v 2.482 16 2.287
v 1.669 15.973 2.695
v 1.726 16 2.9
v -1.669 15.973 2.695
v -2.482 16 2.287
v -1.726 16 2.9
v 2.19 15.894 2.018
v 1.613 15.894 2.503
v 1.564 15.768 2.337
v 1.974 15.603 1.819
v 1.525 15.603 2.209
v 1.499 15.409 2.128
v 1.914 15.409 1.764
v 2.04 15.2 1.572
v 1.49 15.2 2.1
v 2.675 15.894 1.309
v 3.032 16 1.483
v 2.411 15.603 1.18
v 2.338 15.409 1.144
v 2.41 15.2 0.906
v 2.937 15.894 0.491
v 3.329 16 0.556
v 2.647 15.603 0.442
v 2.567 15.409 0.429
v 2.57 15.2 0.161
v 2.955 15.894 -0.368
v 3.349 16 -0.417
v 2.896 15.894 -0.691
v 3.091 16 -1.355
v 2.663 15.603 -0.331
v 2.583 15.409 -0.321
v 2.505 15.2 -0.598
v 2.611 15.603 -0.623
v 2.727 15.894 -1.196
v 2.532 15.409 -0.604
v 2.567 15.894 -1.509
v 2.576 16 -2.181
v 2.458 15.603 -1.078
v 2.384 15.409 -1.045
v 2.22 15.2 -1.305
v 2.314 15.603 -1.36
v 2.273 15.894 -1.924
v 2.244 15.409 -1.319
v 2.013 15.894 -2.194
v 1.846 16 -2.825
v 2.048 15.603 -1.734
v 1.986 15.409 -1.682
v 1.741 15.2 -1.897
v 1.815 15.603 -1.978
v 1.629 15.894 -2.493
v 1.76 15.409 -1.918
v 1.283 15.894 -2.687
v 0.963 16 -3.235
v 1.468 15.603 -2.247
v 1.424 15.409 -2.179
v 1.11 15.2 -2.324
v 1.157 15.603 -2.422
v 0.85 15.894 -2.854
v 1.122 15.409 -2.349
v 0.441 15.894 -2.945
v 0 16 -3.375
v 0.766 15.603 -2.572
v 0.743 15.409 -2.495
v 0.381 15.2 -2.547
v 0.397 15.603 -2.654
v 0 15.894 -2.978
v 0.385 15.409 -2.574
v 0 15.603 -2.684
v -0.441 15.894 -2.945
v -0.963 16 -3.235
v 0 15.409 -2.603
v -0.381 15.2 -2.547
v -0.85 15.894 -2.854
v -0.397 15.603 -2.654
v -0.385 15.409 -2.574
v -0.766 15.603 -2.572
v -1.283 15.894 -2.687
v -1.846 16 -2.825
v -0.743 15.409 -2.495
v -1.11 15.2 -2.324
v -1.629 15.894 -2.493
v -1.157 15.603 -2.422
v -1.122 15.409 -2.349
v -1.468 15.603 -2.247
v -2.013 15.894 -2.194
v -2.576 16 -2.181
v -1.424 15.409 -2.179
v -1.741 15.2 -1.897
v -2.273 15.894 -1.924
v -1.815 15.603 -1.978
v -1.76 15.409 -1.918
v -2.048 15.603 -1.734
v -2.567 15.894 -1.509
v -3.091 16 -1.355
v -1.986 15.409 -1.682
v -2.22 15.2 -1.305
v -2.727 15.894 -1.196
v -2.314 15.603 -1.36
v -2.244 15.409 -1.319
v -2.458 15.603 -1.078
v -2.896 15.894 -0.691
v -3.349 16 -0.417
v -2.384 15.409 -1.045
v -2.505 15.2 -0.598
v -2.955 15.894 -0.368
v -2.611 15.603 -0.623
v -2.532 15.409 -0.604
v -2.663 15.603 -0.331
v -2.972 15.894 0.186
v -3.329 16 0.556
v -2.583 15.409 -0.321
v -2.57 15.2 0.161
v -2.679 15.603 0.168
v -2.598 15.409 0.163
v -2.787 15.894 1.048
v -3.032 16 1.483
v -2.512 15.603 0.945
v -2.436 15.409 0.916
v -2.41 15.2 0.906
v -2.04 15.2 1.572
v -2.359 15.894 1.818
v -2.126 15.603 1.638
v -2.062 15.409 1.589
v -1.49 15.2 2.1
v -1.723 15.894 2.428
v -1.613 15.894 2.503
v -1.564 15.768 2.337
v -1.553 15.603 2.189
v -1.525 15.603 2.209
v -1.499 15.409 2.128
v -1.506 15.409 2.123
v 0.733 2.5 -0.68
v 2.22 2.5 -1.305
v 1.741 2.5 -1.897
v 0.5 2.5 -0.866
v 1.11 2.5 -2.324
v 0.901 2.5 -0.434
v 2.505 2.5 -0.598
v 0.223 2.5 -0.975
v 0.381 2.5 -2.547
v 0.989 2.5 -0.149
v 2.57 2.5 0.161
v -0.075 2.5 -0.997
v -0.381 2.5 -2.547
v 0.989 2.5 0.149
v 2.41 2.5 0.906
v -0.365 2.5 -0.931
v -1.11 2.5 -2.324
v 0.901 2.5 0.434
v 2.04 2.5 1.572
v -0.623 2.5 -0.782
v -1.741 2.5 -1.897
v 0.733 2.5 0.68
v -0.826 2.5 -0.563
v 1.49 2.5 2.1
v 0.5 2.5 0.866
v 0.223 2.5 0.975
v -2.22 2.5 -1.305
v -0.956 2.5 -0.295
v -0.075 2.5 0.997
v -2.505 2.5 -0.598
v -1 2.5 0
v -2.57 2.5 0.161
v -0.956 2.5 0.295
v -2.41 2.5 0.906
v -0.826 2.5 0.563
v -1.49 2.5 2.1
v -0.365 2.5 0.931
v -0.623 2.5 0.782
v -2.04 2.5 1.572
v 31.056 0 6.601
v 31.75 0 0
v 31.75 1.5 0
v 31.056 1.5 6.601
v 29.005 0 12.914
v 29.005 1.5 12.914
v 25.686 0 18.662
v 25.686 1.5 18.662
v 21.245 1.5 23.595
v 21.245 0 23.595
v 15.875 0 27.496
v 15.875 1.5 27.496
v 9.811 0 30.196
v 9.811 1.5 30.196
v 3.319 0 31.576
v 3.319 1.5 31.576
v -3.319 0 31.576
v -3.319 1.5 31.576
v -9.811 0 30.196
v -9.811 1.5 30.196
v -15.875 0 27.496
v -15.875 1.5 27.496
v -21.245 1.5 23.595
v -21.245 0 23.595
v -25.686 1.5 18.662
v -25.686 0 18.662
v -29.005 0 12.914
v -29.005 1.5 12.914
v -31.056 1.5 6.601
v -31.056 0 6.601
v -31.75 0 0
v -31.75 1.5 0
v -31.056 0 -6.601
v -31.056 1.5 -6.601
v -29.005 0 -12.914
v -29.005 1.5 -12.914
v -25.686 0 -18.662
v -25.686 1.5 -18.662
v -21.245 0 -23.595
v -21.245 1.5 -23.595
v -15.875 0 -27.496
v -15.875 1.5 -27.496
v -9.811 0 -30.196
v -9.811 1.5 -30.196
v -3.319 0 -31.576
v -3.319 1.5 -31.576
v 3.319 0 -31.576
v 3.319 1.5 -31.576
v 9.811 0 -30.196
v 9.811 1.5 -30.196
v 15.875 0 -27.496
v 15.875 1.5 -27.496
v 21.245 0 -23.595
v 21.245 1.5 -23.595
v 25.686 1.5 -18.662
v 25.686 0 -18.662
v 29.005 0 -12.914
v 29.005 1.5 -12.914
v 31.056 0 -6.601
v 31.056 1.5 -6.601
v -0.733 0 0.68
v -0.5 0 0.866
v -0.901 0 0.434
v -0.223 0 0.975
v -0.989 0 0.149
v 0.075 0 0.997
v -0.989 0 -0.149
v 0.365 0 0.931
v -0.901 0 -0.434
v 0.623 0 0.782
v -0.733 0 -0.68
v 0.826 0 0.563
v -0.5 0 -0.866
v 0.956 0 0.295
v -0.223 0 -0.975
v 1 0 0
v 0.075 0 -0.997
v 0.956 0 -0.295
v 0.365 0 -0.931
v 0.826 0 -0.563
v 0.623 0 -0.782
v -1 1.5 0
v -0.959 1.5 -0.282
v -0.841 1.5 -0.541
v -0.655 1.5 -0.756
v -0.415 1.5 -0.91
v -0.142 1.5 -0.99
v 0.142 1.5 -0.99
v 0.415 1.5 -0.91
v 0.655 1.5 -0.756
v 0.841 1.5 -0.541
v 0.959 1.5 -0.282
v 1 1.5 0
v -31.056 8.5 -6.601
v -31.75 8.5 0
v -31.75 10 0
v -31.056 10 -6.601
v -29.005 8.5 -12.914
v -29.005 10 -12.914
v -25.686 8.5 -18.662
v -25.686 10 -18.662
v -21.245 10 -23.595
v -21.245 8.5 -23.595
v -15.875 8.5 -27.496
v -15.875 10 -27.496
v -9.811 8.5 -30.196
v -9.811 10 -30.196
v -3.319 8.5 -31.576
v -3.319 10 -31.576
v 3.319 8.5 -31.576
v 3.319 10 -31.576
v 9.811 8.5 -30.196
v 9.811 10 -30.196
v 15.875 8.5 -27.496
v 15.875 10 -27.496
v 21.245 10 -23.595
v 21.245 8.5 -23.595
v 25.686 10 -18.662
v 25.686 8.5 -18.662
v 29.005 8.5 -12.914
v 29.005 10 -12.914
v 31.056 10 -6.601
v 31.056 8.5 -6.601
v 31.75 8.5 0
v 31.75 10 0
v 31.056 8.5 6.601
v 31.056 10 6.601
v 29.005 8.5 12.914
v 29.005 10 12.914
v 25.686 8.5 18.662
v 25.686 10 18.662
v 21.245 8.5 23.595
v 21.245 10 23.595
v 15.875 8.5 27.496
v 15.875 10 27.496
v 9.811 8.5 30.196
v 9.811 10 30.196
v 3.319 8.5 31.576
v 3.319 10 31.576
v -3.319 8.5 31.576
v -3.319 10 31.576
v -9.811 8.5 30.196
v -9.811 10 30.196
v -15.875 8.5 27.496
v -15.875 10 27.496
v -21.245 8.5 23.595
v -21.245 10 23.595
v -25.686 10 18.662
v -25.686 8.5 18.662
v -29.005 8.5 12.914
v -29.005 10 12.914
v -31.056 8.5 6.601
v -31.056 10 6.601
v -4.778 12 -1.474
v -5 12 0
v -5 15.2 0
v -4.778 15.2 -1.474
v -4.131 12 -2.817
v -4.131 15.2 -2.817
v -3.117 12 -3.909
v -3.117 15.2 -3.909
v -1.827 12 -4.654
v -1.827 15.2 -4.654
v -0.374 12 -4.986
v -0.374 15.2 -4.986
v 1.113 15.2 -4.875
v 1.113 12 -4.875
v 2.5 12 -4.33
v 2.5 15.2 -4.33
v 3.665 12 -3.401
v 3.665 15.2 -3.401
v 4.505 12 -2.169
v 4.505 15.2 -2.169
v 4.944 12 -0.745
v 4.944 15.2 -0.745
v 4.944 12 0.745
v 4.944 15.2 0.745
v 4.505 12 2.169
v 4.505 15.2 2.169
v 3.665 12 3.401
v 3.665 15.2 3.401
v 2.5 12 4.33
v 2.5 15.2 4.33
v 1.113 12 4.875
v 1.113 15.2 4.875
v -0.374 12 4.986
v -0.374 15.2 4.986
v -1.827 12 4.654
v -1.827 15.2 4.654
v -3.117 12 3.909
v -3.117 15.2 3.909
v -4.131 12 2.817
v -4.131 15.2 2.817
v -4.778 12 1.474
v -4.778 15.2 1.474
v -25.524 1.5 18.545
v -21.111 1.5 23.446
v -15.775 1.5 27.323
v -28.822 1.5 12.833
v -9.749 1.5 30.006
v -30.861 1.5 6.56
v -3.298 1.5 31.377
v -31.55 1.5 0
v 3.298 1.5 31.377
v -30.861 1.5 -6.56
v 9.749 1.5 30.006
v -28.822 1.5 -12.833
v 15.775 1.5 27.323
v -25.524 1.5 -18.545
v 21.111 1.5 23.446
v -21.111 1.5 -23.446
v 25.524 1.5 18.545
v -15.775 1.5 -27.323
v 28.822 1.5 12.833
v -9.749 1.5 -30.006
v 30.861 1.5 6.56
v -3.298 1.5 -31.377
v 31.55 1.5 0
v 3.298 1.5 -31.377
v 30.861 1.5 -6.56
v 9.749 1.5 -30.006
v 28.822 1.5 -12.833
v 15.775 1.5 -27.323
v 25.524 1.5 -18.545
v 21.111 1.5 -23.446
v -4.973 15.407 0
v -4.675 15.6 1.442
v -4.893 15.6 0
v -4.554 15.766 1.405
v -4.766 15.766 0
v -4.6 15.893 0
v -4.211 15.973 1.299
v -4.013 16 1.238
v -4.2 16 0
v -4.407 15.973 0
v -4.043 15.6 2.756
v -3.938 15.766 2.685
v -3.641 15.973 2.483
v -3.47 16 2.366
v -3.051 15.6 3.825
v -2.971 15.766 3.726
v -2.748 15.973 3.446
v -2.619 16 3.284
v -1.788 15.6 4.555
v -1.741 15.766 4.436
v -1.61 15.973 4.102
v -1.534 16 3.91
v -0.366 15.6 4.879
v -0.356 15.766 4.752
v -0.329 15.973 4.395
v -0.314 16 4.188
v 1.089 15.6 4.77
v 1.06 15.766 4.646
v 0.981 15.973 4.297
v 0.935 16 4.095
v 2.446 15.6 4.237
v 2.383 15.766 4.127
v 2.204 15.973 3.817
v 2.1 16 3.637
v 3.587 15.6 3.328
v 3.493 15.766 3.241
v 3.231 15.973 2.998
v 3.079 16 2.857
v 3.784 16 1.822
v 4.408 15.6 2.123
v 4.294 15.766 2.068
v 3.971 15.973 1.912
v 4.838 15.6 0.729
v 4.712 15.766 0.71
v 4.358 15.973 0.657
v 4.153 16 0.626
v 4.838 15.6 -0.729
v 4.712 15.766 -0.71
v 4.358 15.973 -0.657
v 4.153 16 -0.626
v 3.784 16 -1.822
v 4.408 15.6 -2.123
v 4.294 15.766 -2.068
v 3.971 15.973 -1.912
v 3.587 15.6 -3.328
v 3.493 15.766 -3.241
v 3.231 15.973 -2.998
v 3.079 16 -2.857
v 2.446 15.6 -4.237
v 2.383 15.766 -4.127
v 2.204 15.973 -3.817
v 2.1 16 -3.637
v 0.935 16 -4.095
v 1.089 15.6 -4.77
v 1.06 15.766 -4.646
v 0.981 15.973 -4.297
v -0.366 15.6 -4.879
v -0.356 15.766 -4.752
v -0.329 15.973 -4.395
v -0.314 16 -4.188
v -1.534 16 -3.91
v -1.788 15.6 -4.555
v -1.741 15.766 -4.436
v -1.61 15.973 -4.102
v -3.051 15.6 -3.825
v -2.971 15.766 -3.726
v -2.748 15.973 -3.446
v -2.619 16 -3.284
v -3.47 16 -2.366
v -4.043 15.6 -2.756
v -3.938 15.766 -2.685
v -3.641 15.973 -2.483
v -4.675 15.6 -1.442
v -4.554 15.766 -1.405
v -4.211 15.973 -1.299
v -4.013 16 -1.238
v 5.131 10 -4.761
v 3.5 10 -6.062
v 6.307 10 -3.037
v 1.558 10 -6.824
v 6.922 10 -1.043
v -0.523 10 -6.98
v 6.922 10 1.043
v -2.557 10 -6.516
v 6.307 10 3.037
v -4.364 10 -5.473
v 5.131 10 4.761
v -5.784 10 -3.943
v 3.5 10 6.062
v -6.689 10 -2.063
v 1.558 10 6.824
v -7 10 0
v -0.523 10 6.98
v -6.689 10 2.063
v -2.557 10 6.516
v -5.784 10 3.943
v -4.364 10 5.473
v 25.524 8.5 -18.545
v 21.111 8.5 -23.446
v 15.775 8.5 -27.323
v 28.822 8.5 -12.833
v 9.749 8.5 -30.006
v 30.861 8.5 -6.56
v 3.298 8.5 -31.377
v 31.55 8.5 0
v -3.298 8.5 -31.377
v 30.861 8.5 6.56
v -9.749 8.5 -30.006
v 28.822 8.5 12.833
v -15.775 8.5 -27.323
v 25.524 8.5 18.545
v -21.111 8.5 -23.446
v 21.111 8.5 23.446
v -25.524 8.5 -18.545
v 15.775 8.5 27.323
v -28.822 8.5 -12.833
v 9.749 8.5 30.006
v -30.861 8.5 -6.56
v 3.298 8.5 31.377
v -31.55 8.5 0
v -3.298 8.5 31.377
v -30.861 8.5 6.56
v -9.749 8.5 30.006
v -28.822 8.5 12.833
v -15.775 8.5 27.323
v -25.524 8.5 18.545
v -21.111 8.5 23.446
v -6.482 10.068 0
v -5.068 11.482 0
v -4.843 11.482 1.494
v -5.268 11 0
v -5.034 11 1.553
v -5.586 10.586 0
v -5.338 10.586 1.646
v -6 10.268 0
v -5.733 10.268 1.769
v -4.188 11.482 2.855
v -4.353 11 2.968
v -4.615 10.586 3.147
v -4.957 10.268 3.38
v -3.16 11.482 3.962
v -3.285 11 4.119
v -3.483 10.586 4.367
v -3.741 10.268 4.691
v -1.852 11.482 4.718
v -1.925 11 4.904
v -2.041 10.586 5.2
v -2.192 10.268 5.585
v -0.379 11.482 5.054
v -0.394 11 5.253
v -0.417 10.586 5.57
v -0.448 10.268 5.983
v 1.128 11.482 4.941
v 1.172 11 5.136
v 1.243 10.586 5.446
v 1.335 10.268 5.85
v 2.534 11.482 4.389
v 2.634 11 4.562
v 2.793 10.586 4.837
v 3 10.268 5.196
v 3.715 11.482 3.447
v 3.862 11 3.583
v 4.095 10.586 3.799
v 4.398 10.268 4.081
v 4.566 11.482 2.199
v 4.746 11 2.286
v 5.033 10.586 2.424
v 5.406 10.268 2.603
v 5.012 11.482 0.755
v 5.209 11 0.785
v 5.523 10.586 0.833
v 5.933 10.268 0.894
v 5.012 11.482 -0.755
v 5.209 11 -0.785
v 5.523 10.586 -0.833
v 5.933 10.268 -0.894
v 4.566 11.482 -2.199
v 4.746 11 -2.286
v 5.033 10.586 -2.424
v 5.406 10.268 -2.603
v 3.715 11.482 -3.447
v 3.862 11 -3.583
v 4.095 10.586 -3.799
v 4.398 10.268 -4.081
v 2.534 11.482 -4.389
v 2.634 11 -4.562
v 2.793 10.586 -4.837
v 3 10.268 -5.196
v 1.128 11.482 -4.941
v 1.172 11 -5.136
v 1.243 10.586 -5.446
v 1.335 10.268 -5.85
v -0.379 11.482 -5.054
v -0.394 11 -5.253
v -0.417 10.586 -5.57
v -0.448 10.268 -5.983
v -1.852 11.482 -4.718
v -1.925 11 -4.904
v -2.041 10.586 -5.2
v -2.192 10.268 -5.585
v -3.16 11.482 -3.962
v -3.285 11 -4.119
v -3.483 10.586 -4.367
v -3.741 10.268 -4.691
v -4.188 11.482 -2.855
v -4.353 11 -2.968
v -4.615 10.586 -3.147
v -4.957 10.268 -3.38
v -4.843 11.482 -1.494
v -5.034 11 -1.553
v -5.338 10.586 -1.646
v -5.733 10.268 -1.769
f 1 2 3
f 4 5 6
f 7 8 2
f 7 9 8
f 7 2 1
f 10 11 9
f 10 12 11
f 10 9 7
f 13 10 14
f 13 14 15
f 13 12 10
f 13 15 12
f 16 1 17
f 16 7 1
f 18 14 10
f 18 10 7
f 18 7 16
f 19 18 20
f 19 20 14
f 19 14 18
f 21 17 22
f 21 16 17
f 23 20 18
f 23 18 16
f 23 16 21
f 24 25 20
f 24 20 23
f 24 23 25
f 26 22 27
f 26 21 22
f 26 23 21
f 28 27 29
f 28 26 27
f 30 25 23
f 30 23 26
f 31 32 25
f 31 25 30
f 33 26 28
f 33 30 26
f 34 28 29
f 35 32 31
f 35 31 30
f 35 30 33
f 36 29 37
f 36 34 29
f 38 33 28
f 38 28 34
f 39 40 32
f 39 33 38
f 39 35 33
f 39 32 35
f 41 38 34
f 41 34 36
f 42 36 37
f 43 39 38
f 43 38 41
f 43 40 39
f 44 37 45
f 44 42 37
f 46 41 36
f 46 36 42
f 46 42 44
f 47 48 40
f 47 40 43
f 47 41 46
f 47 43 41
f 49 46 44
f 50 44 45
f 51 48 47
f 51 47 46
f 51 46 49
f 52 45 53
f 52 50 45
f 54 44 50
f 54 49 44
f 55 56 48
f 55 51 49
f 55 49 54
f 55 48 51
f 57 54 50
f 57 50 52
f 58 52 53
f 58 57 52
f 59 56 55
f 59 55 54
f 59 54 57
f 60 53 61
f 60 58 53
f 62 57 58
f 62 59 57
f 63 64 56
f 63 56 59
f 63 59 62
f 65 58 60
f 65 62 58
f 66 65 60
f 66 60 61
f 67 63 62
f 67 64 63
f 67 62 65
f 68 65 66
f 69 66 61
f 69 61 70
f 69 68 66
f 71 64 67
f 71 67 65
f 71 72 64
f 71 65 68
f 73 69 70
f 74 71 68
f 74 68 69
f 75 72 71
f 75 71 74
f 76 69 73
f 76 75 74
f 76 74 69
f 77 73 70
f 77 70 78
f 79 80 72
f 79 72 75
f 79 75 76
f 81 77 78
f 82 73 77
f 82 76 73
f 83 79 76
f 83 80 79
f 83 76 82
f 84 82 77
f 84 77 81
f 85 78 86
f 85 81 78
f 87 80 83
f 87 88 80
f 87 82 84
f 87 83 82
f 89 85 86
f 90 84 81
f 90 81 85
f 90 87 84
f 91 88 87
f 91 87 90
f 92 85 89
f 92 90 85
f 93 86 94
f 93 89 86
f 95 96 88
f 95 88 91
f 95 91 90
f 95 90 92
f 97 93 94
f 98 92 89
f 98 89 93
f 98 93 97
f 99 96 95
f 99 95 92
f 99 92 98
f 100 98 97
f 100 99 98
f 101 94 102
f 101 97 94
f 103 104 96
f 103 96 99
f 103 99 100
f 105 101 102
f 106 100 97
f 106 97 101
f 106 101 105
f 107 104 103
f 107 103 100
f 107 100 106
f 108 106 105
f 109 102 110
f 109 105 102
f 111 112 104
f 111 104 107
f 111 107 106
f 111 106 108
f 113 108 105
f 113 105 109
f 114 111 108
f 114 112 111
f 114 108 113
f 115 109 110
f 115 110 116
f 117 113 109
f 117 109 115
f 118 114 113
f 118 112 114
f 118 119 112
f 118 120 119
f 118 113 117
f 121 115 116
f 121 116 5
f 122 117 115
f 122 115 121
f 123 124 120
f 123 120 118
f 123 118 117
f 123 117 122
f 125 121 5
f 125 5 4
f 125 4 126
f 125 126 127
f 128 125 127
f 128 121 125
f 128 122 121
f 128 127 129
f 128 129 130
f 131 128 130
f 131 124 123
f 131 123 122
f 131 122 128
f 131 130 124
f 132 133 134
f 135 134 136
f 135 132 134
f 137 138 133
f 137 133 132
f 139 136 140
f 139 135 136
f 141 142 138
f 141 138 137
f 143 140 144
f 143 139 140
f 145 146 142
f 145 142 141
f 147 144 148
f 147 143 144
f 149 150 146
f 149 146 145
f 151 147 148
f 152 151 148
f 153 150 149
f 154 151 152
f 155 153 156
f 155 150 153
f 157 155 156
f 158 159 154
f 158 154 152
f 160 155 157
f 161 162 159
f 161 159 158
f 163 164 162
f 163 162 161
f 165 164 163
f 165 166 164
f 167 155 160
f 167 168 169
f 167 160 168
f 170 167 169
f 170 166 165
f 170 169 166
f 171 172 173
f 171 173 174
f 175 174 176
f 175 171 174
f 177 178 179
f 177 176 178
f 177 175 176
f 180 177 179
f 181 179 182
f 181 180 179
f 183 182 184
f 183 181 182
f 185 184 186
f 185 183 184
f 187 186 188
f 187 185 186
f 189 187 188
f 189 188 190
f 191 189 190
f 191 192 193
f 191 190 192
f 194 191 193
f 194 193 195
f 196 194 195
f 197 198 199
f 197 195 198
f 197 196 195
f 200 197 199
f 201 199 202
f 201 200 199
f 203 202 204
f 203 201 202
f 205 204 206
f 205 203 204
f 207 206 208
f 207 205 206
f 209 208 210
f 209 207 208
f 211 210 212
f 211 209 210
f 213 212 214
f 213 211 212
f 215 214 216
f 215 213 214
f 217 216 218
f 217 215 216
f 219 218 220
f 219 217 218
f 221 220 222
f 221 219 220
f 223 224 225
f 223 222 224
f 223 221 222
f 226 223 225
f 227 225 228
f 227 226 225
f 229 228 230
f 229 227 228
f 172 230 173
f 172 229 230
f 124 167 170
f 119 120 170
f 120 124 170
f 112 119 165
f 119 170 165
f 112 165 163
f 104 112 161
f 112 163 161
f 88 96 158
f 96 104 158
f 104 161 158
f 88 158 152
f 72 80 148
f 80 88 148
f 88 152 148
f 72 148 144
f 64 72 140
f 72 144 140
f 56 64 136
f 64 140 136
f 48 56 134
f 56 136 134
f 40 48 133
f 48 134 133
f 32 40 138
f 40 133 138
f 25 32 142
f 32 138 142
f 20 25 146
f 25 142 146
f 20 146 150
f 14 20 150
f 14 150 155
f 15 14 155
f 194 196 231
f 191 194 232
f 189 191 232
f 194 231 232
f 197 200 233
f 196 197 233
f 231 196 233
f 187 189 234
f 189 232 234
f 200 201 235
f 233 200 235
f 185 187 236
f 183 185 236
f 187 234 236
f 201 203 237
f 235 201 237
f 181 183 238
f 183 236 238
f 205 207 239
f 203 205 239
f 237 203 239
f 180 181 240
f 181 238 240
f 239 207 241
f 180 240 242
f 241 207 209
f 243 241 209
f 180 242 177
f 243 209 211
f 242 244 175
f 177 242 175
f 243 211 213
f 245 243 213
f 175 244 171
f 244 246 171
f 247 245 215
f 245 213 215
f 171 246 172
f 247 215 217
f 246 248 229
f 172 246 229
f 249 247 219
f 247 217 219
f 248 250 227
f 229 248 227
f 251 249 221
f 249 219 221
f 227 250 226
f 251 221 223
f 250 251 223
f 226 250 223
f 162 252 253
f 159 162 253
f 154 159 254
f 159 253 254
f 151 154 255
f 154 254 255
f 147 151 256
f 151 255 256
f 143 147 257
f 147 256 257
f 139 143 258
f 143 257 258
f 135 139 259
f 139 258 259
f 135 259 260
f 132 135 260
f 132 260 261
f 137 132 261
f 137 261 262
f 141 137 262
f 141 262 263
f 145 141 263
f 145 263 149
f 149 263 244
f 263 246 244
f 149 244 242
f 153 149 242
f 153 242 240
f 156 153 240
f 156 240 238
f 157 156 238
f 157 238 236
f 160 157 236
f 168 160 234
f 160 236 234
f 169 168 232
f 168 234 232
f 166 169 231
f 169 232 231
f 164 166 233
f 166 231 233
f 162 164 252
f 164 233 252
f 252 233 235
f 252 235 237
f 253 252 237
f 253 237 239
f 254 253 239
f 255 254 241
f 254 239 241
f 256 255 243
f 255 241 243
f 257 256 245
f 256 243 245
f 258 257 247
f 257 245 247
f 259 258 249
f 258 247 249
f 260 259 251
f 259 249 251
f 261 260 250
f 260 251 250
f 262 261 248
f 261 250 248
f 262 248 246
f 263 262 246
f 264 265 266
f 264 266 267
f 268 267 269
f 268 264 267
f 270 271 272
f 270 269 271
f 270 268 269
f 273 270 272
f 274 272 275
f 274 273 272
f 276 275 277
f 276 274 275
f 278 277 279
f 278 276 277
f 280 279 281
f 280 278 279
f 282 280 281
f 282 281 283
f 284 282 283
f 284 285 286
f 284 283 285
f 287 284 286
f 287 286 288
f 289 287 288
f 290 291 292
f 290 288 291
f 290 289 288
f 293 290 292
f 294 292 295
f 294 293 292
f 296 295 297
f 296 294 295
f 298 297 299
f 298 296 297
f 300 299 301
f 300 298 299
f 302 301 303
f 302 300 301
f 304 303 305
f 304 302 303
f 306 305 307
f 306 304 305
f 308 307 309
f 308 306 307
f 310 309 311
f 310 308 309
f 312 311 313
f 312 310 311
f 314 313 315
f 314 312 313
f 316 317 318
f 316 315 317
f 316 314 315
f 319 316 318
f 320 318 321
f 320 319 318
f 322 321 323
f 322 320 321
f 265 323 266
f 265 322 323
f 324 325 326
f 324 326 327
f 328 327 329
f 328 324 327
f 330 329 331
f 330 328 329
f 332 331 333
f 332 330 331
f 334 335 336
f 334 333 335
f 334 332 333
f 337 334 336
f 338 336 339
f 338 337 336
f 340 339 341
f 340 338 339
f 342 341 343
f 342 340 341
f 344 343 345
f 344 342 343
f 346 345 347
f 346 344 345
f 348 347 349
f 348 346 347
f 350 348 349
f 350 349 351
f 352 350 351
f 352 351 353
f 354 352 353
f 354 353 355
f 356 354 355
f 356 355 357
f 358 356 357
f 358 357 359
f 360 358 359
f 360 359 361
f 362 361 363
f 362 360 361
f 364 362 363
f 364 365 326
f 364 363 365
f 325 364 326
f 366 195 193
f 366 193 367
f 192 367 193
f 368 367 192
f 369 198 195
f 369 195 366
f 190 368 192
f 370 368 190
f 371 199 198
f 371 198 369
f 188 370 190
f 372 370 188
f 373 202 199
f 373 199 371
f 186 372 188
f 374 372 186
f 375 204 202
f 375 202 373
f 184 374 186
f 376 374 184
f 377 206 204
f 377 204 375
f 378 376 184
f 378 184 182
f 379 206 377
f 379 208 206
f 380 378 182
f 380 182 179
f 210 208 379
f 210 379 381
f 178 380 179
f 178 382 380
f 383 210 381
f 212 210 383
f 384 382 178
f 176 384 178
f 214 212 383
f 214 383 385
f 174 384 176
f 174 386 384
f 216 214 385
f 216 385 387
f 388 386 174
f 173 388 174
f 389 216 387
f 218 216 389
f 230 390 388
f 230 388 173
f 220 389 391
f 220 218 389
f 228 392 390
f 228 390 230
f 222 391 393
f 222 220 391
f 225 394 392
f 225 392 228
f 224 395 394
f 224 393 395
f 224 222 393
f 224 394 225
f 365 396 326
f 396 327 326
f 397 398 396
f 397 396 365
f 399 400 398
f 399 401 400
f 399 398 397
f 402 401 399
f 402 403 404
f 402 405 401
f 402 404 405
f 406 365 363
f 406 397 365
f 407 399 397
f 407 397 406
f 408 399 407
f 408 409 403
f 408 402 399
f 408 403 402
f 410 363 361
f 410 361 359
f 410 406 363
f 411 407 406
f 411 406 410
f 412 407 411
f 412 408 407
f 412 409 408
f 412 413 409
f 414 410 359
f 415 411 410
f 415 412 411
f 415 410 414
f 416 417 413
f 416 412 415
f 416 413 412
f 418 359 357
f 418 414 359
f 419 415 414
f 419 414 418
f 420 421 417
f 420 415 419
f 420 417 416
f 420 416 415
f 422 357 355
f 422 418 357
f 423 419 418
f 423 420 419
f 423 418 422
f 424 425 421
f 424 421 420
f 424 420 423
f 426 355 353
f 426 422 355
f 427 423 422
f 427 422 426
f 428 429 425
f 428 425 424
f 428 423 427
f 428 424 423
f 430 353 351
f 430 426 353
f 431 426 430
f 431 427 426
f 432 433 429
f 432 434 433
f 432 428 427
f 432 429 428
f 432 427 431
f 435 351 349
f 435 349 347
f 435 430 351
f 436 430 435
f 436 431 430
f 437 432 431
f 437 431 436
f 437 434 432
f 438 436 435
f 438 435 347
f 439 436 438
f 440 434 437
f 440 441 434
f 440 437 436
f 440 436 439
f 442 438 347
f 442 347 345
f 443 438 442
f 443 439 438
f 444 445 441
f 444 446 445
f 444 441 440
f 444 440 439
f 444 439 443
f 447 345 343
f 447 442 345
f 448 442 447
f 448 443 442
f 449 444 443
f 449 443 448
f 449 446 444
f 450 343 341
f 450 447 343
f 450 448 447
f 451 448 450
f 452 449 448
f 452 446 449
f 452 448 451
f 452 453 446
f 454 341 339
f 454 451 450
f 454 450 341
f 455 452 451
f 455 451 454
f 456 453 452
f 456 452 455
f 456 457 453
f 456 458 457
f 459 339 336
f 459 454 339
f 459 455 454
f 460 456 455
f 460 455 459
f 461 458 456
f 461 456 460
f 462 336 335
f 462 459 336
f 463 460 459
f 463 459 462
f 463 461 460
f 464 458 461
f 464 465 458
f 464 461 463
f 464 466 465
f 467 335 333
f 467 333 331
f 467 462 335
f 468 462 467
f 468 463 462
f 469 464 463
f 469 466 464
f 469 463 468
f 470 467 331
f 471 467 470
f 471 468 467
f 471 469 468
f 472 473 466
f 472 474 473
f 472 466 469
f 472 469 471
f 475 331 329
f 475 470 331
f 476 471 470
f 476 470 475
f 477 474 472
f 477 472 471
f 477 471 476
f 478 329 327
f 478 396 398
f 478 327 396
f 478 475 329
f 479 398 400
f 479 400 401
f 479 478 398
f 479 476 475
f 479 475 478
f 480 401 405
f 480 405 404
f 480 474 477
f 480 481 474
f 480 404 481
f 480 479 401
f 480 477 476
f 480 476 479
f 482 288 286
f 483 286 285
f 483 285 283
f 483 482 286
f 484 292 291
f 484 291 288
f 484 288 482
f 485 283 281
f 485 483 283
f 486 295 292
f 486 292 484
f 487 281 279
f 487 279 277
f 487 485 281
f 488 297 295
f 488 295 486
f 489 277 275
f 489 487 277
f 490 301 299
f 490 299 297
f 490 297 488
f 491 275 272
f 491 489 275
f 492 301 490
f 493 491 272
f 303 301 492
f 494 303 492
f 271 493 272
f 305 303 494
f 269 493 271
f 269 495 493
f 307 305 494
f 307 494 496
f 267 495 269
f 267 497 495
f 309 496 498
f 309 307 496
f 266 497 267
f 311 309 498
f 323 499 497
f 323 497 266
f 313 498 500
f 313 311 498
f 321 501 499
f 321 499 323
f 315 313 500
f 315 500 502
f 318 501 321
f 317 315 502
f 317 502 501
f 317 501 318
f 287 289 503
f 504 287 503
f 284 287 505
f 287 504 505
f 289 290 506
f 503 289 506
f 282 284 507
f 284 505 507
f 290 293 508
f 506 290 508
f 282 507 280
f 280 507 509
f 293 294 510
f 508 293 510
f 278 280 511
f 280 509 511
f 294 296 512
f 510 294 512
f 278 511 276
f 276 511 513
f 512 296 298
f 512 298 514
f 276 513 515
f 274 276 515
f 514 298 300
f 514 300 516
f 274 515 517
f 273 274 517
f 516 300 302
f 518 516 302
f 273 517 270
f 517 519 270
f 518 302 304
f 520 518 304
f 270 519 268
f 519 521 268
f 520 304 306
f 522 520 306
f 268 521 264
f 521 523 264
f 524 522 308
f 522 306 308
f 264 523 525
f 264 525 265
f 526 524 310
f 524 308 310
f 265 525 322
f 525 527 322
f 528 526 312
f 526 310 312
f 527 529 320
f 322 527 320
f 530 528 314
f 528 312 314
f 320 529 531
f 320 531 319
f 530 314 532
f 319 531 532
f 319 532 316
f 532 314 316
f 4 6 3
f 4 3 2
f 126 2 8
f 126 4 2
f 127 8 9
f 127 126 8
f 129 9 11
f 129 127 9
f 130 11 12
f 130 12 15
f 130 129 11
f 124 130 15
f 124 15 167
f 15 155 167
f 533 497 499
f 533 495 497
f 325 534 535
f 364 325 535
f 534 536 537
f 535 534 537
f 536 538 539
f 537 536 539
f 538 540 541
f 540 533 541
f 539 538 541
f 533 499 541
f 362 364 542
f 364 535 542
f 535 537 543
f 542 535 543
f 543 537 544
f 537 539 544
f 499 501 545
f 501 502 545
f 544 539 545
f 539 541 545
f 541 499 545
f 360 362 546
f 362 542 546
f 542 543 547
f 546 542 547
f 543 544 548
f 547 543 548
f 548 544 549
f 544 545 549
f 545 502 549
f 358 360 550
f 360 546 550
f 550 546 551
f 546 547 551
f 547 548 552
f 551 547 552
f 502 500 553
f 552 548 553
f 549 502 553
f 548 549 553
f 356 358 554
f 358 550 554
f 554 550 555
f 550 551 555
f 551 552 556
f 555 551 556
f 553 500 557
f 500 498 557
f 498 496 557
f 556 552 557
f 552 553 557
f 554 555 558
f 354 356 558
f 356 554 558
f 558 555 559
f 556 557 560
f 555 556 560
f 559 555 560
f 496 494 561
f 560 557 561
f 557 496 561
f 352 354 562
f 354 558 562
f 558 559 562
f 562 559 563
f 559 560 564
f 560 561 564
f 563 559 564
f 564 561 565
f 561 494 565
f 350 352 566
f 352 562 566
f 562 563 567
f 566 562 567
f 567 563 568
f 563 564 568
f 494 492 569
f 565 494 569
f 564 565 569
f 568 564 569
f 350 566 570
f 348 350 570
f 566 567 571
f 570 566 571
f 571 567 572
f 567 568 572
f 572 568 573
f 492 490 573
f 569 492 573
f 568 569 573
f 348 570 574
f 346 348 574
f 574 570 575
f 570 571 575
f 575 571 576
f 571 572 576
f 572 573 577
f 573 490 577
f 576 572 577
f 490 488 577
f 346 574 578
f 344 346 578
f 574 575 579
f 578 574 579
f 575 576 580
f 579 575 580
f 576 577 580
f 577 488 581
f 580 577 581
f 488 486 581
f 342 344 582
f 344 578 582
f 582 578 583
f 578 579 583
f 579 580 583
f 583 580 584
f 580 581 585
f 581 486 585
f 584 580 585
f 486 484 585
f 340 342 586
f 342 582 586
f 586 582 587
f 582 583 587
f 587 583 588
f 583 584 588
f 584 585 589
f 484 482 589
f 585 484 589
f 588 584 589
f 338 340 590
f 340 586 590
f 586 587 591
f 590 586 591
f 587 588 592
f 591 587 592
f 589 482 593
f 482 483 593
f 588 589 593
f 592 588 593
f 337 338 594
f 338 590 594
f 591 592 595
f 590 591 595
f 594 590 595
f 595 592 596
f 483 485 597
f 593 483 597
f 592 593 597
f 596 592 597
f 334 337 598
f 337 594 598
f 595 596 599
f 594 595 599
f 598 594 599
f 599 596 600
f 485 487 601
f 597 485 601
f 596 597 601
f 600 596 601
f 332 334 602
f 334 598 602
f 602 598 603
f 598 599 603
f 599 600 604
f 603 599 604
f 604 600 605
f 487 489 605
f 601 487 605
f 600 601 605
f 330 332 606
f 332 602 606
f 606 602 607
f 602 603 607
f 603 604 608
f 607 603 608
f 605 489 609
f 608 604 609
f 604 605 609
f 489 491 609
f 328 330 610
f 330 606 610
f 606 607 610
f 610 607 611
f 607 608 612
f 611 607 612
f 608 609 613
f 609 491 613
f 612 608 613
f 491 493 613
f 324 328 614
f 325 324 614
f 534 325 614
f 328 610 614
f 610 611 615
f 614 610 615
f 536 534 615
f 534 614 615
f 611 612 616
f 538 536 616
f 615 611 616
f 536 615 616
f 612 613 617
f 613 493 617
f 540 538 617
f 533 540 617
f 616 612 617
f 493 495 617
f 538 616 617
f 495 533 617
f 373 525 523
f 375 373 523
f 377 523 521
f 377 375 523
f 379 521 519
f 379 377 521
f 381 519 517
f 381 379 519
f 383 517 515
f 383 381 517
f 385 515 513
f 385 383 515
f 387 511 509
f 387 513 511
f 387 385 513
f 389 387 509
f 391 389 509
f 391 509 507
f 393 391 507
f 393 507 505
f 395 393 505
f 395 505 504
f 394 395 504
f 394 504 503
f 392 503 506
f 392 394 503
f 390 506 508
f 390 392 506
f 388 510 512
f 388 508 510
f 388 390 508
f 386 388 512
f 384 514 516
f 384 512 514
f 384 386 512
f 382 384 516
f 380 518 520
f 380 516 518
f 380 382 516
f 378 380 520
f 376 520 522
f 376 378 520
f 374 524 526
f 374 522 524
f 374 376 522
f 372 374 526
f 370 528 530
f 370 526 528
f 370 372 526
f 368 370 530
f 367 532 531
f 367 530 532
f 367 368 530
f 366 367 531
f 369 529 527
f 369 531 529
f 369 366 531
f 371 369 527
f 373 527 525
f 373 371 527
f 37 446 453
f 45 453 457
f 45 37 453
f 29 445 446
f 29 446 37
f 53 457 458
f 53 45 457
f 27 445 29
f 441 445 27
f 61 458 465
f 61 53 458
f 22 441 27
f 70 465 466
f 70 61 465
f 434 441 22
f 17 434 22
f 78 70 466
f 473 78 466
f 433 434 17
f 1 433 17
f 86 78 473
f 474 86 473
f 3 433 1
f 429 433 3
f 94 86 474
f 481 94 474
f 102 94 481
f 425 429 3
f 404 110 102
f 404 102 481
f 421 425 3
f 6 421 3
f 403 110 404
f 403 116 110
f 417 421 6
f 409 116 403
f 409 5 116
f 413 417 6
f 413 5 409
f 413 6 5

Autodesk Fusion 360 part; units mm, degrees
sketch "spodek" plane through (0, 0, 0) normal (0, 1, 0) x (1, 0, 0)
  circle A0 centre (0, 0) radius 31.75
  circle A1 centre (0, 0) radius 1
  dimension "d1" = 63.5
  dimension "d2" = 2
extrude "Extrude1" add sketch "spodek" along normal blind 1.5
sketch "prostredek" plane through (0, 1.5, 0) normal (0, 1, 0) x (-1, 0, 0)
  circle A0 centre (0, 0) radius 1
  circle A1 centre (0, 0) radius 31.75
  circle A2 centre (0, 0) radius 31.55
  line L0 (3.493, -6.05) -> (6.9859, 0)
  line L1 (6.9859, 0) -> (3.493, 6.05)
  line L2 (3.493, 6.05) -> (-3.493, 6.05)
  line L3 (-3.493, 6.05) -> (-6.9859, 0)
  line L4 (-6.9859, 0) -> (-3.493, -6.05)
  line L5 (-3.493, -6.05) -> (3.493, -6.05)
  dimension "d5" = -0.2
  dimension "d6" = 6.05
extrude "Extrude2" add sketch "prostredek" along normal blind 7 contours A2 | L0 L1 L2 L3 L4 L5
sketch "Sketch3" plane through (0, 8.5, 0) normal (0, 1, 0) x (-1, 0, 0)
  circle A0 centre (0, 0) radius 31.75
  line L0 (-1.4902, 2.1) -> (1.4902, 2.1)
  arc A1 (-1.4902, 2.1) -> (1.4902, 2.1) centre (0, 0) ccw
  dimension "d12" = 5.15
  dimension "d13" = 2.1
extrude "Extrude4" cut sketch "Sketch3" against normal blind 6 contours L0 A1
extrude "Extrude5" add sketch "Sketch3" along normal blind 1.5
sketch "Sketch4" plane through (0, 10, 0) normal (0, 1, 0) x (-1, 0, 0)
  arc A0 (-1.4902, 2.1) -> (1.4902, 2.1) centre (0, 0) ccw
  line L0 (-1.4902, 2.1) -> (1.4902, 2.1)
  circle A1 centre (0, 0) radius 31.75
  circle A2 centre (0, 0) radius 5
  dimension "d22" = 10
extrude "Extrude6" add sketch "Sketch4" along normal blind 6 contours A2
fillet "Fillet3" radius 0.8 1 faces at (-0.1246, 16, 3.062)
fillet "Fillet4" radius 2 1 edges at (4.6616, 10, 1.8081)
